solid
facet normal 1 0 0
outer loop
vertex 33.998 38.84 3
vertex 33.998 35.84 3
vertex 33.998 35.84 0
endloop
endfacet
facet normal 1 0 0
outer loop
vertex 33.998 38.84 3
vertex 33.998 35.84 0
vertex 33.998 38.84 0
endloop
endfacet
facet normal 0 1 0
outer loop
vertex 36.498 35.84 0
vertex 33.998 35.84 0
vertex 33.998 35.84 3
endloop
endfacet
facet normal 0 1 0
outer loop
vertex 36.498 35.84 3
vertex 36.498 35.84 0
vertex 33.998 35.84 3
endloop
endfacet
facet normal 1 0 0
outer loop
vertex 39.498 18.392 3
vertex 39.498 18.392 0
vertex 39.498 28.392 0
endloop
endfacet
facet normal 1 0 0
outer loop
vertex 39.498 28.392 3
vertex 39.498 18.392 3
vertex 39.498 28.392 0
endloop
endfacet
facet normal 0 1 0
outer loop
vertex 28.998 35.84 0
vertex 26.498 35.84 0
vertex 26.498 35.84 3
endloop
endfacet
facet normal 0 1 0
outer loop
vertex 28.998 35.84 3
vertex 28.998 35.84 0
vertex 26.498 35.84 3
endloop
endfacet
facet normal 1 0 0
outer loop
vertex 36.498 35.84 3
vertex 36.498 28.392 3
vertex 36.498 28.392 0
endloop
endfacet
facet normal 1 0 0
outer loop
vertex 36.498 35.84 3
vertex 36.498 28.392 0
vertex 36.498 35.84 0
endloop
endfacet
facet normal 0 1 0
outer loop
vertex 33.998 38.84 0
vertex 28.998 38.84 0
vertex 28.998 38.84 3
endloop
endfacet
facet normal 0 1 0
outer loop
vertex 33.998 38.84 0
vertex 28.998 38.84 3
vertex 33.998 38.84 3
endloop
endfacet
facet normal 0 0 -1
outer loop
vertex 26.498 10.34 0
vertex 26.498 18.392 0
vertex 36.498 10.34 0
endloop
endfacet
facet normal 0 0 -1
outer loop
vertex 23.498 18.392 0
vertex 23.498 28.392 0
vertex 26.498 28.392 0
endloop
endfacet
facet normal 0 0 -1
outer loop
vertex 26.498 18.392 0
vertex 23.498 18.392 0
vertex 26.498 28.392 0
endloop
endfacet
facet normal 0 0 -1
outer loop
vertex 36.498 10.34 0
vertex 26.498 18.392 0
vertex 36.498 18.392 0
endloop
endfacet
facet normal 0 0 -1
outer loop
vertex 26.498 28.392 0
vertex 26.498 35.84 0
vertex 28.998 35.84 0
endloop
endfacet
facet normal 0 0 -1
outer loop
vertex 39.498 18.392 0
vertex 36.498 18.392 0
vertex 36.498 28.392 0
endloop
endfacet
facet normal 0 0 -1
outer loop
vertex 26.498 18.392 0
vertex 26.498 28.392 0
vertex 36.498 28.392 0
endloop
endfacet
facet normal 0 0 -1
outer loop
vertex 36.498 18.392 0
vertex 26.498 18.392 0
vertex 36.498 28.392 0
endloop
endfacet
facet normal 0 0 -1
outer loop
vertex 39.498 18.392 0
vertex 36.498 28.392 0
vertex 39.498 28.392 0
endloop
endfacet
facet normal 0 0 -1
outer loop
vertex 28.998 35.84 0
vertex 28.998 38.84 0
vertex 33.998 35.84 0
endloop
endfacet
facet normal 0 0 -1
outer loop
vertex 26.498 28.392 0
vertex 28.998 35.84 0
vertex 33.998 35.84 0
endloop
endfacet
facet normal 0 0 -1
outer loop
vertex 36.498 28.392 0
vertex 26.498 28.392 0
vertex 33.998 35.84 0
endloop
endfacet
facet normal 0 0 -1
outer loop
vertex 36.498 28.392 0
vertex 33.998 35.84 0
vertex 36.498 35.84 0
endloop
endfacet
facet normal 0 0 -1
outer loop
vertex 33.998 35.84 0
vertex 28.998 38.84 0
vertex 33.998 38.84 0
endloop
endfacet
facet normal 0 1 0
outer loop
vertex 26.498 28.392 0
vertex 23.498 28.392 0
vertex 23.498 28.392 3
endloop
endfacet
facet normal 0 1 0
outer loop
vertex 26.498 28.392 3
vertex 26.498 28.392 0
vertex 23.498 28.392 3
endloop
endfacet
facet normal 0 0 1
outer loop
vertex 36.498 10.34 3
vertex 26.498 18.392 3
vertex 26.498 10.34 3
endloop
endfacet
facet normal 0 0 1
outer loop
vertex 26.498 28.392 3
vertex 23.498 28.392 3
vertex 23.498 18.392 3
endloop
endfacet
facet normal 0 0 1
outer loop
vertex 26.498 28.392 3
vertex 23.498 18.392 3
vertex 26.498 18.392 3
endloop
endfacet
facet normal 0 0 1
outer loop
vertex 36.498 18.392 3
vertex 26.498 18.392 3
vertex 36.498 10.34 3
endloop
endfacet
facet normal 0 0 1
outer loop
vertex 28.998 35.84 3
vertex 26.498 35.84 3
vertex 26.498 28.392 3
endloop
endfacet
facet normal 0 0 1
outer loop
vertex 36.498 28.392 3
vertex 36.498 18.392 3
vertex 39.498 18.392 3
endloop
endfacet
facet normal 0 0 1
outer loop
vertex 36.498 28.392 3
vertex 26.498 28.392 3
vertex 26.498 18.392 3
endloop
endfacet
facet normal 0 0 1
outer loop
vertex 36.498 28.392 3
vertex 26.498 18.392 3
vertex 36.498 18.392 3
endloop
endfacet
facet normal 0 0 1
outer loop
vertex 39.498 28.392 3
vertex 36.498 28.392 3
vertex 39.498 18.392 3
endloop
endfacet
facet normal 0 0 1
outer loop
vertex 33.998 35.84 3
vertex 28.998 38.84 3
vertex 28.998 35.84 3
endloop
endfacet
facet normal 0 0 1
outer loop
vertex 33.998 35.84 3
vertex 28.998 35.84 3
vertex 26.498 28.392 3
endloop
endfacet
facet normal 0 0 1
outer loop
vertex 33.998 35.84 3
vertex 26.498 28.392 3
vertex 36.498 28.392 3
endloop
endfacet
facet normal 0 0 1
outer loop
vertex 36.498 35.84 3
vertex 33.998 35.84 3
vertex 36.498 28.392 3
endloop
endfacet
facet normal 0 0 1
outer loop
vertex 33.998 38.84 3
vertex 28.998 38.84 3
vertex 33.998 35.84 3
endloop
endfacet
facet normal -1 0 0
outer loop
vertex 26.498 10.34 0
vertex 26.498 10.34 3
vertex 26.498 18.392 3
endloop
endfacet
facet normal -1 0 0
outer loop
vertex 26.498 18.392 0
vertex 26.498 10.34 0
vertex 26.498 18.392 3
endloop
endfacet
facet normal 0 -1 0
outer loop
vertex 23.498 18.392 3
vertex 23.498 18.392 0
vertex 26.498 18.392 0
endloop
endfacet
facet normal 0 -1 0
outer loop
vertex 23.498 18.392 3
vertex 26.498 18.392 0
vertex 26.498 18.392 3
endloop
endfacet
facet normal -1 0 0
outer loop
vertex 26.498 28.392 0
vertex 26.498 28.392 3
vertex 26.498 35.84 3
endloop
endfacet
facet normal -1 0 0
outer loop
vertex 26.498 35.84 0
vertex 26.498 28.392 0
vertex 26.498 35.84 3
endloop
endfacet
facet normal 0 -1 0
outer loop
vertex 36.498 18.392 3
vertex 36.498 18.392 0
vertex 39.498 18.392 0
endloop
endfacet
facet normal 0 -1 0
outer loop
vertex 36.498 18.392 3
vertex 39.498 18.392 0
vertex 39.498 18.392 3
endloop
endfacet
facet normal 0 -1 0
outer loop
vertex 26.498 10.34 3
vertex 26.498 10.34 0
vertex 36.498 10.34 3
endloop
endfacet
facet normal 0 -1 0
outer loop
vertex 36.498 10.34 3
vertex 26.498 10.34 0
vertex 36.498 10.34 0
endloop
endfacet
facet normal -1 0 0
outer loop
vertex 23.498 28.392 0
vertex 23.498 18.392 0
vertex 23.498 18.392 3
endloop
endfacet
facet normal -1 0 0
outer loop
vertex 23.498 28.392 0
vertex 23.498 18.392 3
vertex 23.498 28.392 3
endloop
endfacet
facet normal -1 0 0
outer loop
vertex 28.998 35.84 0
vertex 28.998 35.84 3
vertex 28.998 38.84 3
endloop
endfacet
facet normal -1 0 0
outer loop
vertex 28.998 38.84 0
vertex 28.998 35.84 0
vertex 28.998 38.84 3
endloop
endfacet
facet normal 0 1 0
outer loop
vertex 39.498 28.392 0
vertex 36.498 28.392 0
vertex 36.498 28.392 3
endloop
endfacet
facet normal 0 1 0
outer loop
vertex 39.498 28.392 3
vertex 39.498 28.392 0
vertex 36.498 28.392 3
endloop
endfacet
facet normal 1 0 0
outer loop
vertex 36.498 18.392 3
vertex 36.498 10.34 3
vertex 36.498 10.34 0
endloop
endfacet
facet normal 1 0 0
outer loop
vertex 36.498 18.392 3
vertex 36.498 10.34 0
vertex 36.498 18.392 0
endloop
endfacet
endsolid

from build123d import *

# Parameters (mm, degrees)
SKETCH1_W             = 16
SKETCH1_H             = 28.5
BOSS_EXTRUDE1_DEPTH   = 3
CAVITY1_START         = 23.498167492
CAVITY1_OUTLINE_W     = 10.447458445
CAVITY1_OUTLINE_H     = 3
CAVITY1_OUTLINE_W_2   = 8.052541555
CAVITY1_DEPTH         = 3
CAVITY1_START_2       = 36.498167492
CAVITY1_2_OUTLINE_W   = 10.447458445
CAVITY1_2_OUTLINE_H   = 3
CAVITY1_2_OUTLINE_W_2 = 8.052541555
CAVITY1_2_DEPTH       = 3
CAVITY1_START_3       = 26.498167492
CAVITY1_3_OUTLINE_W   = 3
CAVITY1_3_OUTLINE_H   = 3
CAVITY1_3_DEPTH       = 2.5
CAVITY1_START_4       = 33.998167492
CAVITY1_4_OUTLINE_W   = 3
CAVITY1_4_OUTLINE_H   = 3
CAVITY1_4_DEPTH       = 2.5


# Read off the part's stored shape, not the designer's step: Cavity1
with BuildPart() as part:
    # Sketch1 → Boss-Extrude1 (new body)
    with BuildSketch(Plane.XY):
        with Locations((31.498167492, 24.589698152)):
            Rectangle(SKETCH1_W, SKETCH1_H)
    extrude(amount=BOSS_EXTRUDE1_DEPTH)

    # Cavity1 outline → Cavity1 (cut)
    with BuildSketch(Plane.YZ.offset(CAVITY1_START)):
        with Locations((33.615968929, 1.5)):
            Rectangle(CAVITY1_OUTLINE_W, CAVITY1_OUTLINE_H)
        with Locations((14.36596893, 1.5)):
            Rectangle(CAVITY1_OUTLINE_W_2, CAVITY1_OUTLINE_H)
    extrude(amount=CAVITY1_DEPTH, mode=Mode.SUBTRACT)

    # Cavity1 2 outline → Cavity1 2 (cut)
    with BuildSketch(Plane.YZ.offset(CAVITY1_START_2)):
        with Locations((33.615968929, 1.5)):
            Rectangle(CAVITY1_2_OUTLINE_W, CAVITY1_2_OUTLINE_H)
        with Locations((14.36596893, 1.5)):
            Rectangle(CAVITY1_2_OUTLINE_W_2, CAVITY1_2_OUTLINE_H)
    extrude(amount=CAVITY1_2_DEPTH, mode=Mode.SUBTRACT)

    # Cavity1 3 outline → Cavity1 3 (cut)
    with BuildSketch(Plane.YZ.offset(CAVITY1_START_3)):
        with Locations((37.339698152, 1.5)):
            Rectangle(CAVITY1_3_OUTLINE_W, CAVITY1_3_OUTLINE_H)
    extrude(amount=CAVITY1_3_DEPTH, mode=Mode.SUBTRACT)

    # Cavity1 4 outline → Cavity1 4 (cut)
    with BuildSketch(Plane.YZ.offset(CAVITY1_START_4)):
        with Locations((37.339698152, 1.5)):
            Rectangle(CAVITY1_4_OUTLINE_W, CAVITY1_4_OUTLINE_H)
    extrude(amount=CAVITY1_4_DEPTH, mode=Mode.SUBTRACT)


solid = part.part
